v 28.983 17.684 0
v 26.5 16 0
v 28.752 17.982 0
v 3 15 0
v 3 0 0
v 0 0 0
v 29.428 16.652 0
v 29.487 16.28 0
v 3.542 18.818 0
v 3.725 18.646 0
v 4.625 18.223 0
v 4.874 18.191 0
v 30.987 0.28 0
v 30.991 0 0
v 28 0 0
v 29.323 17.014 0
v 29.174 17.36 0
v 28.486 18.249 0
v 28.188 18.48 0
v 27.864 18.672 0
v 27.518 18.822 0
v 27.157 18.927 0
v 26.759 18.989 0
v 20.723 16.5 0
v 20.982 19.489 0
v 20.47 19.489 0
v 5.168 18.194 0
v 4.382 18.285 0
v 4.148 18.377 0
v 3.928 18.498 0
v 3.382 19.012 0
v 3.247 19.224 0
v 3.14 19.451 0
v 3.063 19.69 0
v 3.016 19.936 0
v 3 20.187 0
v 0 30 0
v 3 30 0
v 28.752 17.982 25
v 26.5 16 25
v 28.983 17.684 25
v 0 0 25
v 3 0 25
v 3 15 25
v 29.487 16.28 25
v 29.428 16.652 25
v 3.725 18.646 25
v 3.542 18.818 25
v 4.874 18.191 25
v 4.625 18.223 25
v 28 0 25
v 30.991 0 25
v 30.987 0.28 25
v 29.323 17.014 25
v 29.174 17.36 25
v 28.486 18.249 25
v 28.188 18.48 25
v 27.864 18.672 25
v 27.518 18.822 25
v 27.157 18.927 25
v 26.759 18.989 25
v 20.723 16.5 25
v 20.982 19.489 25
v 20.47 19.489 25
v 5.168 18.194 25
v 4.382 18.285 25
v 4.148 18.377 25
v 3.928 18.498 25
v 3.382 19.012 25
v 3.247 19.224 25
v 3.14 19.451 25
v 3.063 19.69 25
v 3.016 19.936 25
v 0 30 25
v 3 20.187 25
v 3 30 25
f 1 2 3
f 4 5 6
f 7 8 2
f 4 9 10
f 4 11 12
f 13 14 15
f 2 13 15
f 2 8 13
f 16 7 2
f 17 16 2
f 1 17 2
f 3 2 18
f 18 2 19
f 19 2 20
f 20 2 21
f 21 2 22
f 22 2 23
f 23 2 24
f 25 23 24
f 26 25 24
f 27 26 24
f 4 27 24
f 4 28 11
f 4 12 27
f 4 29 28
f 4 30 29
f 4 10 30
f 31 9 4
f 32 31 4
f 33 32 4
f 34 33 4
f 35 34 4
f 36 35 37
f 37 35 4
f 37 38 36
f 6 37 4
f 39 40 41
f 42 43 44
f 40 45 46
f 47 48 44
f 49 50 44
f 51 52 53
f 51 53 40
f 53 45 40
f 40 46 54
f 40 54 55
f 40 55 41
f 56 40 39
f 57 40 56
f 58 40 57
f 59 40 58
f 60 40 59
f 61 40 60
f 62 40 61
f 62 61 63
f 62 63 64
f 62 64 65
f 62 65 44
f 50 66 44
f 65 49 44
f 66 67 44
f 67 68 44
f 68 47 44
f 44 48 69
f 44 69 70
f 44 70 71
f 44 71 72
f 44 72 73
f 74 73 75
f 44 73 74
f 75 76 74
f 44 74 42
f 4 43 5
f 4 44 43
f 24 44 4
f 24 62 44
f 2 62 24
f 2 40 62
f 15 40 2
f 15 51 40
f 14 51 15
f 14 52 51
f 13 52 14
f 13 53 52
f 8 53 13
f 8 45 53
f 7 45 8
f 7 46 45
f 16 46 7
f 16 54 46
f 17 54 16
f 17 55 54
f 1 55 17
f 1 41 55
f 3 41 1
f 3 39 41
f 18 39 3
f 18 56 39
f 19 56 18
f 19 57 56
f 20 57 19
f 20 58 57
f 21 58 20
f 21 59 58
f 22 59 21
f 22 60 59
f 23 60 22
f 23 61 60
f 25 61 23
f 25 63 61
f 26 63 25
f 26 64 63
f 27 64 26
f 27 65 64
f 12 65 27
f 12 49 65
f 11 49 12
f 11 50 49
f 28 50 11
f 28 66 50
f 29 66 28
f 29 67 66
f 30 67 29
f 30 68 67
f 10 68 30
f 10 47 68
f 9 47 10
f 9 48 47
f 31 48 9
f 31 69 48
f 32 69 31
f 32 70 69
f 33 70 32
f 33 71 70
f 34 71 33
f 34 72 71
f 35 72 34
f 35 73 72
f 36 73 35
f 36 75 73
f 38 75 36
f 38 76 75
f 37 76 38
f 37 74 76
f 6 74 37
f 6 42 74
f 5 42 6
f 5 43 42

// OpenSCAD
$fn = 50;
delta = 0.001;

ext = 1;    // запас на точность измерений
thick = 25; 

topWidth = 22.5;
width = topWidth + ext; // раствор по верхней кромке
dw = 1.5;
w2 = width + dw;  // раствор по нижней кромке
peakX = 17;         // точка излома
dh = 1.5;           // высоты изломов
dh2 = 0.5;

peak = peakX + 1.0 * ext*peakX/width;

height = 15; // высота раствора
wall = 3;
hand = 12;  // высота "ручки"
r = 2;      // радиус кривизны сопряжений


invCosAl = sqrt(peak * peak + dh*dh) / peak;



linear_extrude(height = thick) 
{    
    translate([wall, 0])
        difference() {
            offset(wall)
                polygon([[0, 0], [0, height], [peak, height + dh], [width, height + dh - dh2], [w2, 0], [w2, 0]]);
            polygon([[0, -delta], [0, height], [peak, height + dh], [width, height + dh - dh2], [w2, 0], [w2, -delta]]);  
            translate([-wall - delta /2, -wall - delta])
              square([w2 + 2 * wall + delta, wall + delta]);
        }
        
    translate([0, height])
    difference() {
        polygon([[0, 0], [0, hand + wall], [wall + 2*r, hand + wall], [wall + 2* r, dh * 2 * r / peak]]);
        
        translate([wall, wall * invCosAl])        
            offset(r = r)        
                offset(r = -r)
                    polygon([[0, 0], [0, hand + r], [peak, hand + r], [peak, dh]]);
    }
}
